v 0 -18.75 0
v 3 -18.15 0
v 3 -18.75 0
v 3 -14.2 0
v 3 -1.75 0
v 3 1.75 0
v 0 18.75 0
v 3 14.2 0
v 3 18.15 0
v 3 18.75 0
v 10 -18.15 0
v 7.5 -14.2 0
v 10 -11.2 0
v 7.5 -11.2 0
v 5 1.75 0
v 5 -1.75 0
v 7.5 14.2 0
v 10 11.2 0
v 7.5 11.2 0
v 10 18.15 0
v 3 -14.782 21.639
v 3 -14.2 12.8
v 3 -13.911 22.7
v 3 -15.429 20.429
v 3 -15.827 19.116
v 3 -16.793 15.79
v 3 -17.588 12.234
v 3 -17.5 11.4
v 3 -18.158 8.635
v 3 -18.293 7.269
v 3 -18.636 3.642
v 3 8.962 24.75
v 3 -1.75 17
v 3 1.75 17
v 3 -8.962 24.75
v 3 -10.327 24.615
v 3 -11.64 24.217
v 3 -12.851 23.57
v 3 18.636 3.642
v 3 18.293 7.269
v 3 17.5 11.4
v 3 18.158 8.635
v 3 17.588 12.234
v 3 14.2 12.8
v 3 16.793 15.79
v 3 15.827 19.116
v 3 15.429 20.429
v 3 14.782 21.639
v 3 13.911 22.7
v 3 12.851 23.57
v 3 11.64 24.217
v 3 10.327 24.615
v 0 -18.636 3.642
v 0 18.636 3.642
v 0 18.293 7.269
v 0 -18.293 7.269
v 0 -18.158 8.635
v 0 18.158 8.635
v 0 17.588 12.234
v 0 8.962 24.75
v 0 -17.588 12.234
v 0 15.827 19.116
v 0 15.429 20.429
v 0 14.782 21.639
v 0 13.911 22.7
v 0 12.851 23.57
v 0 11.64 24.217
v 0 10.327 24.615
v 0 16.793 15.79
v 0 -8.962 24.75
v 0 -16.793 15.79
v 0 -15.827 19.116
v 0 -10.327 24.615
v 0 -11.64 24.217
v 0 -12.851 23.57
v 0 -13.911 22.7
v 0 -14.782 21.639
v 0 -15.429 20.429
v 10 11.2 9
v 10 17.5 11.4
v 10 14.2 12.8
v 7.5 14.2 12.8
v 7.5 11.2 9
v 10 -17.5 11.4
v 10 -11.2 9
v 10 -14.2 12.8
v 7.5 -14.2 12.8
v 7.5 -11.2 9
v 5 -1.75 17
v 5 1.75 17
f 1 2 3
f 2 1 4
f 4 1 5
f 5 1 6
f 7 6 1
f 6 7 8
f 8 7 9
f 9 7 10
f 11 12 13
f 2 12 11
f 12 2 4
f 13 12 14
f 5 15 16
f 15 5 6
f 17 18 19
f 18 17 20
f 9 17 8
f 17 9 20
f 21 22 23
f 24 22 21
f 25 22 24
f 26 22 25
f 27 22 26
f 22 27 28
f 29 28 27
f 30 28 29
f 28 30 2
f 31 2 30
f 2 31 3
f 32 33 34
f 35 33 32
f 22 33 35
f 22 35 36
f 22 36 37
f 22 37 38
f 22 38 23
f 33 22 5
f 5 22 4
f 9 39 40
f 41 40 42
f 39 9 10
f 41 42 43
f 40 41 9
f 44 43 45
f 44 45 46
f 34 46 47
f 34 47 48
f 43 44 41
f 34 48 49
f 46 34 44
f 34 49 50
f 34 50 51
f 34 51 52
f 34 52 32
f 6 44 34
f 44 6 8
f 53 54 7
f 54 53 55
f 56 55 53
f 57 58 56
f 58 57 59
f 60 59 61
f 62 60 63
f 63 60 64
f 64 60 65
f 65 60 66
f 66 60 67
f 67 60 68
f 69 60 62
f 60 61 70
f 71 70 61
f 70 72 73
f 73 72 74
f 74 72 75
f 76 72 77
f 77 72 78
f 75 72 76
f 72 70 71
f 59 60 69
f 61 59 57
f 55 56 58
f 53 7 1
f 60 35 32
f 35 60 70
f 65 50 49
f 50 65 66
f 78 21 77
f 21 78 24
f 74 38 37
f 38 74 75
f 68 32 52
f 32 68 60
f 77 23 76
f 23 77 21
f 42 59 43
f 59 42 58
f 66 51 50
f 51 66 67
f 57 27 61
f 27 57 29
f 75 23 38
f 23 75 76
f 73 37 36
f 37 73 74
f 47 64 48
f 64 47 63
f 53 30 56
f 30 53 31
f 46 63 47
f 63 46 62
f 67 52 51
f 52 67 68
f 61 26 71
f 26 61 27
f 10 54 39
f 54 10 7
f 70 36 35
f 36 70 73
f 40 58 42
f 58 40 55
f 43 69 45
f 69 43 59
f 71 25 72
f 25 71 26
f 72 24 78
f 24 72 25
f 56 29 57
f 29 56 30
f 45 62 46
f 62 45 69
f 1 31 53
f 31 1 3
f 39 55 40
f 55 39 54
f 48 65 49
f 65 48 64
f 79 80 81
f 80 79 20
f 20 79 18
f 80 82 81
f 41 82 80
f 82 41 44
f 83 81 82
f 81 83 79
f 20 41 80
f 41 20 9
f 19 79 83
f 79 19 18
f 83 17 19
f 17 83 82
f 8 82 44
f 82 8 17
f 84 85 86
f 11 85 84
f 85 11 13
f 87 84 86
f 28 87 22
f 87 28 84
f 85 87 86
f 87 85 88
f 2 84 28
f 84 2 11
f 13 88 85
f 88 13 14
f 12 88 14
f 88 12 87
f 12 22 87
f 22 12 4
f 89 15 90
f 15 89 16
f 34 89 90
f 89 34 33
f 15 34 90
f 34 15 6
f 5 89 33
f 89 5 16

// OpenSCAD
// file: simple_objects.scad
//
// Simple objects
//
// By Jay Abbott 2013
//



/**
 * Box
 *
 * Draws a simple box with dimensions provided in the sz vector.
 *
 * The origin (transformation centre) of the box is controlled by the
 * cx, cy, and cz parameters. 0 for any axis means that the lower-extent
 * of the box is at the origin, and the box extends entirely in the
 * positive direction along that axis. 1 means the upper-edge of the
 * box is at the origin, and the box extends entirely in the negative
 * direction along that axis.
 *
 * The default centre-value is 0.5 for all axes so that the
 * origin of the box is in the centre of the box shape.
 *
 * @param sz	A vector with the [x, y, z] dimensions.
 * @param cx	The x-center
 * @param cy	The y-center
 * @param cz	The z-center
 */

module box(
	sz	= [1, 1, 1],
	cx	= 0.5,
	cy	= 0.5,
	cz	= 0.5)
{
	translate([-sz[0] * cx, -sz[1] * cy, -sz[2] * cz])
		cube(sz);
}
// main file
//
// GoPro Quick Release Base
//
// By Jay Abbott 2014
//

use <simple_objects.scad>;


// Constants
// --------------------------------

$fn = 32;

baseWidth = 37.5;
baseLength = 49.5;
baseThickness = 3;
baseOuterCurveRadius = 58;
minkowskiRadius = 7;

clipInteriorWidth = 28.4;
clipInteriorHeight = 4.5;
clipLength = 25.6;
clipWallThicknessMin = 3.3;
clipWallThicknessMax = 3.95;
clipRoofTopHeight = 7.0;
clipRoofOverhang = 3.0;
clipHookBacklash = 1.4;
clipEaseInDistance = 3.8;

centreGuideWidth = 3.5;
centreGuideHeight = 2;
centreGuideLength = 34;



// Modules
// --------------------------------

module baseHalf()
{
	intersection()
	{
		box([baseLength / 2, baseWidth, baseThickness], cx = 1, cz = 0);
		minkowski()
		{
			intersection()
			{
				box([(baseLength / 2) - minkowskiRadius, baseWidth - (2 * minkowskiRadius), baseThickness], cx = 1, cz = 0);
				translate([0, (baseWidth / 2) - baseOuterCurveRadius - minkowskiRadius, 0])
					cylinder(r = baseOuterCurveRadius, h = baseThickness, $fn=100);
				translate([0, -(baseWidth / 2) + baseOuterCurveRadius + minkowskiRadius, 0])
					cylinder(r = baseOuterCurveRadius, h = baseThickness, $fn = 100);
			}
			cylinder(r = minkowskiRadius, h = baseThickness);
		}
	}
}

module centreGuide()
{
	box([centreGuideLength / 2, centreGuideWidth, baseThickness + centreGuideHeight], cx = 1, cz = 0);
}

module clipRight()
{
	translate([0, (clipInteriorWidth / 2) - clipRoofOverhang, 0])
		difference()
		{
			linear_extrude(height = baseThickness + clipRoofTopHeight)
			{
				polygon
				([
					[0,											0],
					[0,											clipRoofOverhang + clipWallThicknessMax],
					[-((clipLength / 2) - clipHookBacklash),	clipRoofOverhang + clipWallThicknessMin],
					[-(clipLength / 2),							clipRoofOverhang],
					[-((clipLength / 2) - clipEaseInDistance),	0],
				]);
			}
			translate([0.5, -0.5, -0.5])
				box([(clipLength / 2) + 1, clipRoofOverhang + 0.5, baseThickness + clipInteriorHeight + 0.5], cx = 1, cy = 0, cz = 0);
		}
}

module clipLeft()
{
	mirror([0, 1, 0])
		clipRight();
}

module quickReleaseBaseHalf()
{
	rotate([0, 90, 0])
	union()
	{
		baseHalf();
		centreGuide();
		clipLeft();
		clipRight();
	}
}


// The Model
// --------------------------------

quickReleaseBaseHalf();
